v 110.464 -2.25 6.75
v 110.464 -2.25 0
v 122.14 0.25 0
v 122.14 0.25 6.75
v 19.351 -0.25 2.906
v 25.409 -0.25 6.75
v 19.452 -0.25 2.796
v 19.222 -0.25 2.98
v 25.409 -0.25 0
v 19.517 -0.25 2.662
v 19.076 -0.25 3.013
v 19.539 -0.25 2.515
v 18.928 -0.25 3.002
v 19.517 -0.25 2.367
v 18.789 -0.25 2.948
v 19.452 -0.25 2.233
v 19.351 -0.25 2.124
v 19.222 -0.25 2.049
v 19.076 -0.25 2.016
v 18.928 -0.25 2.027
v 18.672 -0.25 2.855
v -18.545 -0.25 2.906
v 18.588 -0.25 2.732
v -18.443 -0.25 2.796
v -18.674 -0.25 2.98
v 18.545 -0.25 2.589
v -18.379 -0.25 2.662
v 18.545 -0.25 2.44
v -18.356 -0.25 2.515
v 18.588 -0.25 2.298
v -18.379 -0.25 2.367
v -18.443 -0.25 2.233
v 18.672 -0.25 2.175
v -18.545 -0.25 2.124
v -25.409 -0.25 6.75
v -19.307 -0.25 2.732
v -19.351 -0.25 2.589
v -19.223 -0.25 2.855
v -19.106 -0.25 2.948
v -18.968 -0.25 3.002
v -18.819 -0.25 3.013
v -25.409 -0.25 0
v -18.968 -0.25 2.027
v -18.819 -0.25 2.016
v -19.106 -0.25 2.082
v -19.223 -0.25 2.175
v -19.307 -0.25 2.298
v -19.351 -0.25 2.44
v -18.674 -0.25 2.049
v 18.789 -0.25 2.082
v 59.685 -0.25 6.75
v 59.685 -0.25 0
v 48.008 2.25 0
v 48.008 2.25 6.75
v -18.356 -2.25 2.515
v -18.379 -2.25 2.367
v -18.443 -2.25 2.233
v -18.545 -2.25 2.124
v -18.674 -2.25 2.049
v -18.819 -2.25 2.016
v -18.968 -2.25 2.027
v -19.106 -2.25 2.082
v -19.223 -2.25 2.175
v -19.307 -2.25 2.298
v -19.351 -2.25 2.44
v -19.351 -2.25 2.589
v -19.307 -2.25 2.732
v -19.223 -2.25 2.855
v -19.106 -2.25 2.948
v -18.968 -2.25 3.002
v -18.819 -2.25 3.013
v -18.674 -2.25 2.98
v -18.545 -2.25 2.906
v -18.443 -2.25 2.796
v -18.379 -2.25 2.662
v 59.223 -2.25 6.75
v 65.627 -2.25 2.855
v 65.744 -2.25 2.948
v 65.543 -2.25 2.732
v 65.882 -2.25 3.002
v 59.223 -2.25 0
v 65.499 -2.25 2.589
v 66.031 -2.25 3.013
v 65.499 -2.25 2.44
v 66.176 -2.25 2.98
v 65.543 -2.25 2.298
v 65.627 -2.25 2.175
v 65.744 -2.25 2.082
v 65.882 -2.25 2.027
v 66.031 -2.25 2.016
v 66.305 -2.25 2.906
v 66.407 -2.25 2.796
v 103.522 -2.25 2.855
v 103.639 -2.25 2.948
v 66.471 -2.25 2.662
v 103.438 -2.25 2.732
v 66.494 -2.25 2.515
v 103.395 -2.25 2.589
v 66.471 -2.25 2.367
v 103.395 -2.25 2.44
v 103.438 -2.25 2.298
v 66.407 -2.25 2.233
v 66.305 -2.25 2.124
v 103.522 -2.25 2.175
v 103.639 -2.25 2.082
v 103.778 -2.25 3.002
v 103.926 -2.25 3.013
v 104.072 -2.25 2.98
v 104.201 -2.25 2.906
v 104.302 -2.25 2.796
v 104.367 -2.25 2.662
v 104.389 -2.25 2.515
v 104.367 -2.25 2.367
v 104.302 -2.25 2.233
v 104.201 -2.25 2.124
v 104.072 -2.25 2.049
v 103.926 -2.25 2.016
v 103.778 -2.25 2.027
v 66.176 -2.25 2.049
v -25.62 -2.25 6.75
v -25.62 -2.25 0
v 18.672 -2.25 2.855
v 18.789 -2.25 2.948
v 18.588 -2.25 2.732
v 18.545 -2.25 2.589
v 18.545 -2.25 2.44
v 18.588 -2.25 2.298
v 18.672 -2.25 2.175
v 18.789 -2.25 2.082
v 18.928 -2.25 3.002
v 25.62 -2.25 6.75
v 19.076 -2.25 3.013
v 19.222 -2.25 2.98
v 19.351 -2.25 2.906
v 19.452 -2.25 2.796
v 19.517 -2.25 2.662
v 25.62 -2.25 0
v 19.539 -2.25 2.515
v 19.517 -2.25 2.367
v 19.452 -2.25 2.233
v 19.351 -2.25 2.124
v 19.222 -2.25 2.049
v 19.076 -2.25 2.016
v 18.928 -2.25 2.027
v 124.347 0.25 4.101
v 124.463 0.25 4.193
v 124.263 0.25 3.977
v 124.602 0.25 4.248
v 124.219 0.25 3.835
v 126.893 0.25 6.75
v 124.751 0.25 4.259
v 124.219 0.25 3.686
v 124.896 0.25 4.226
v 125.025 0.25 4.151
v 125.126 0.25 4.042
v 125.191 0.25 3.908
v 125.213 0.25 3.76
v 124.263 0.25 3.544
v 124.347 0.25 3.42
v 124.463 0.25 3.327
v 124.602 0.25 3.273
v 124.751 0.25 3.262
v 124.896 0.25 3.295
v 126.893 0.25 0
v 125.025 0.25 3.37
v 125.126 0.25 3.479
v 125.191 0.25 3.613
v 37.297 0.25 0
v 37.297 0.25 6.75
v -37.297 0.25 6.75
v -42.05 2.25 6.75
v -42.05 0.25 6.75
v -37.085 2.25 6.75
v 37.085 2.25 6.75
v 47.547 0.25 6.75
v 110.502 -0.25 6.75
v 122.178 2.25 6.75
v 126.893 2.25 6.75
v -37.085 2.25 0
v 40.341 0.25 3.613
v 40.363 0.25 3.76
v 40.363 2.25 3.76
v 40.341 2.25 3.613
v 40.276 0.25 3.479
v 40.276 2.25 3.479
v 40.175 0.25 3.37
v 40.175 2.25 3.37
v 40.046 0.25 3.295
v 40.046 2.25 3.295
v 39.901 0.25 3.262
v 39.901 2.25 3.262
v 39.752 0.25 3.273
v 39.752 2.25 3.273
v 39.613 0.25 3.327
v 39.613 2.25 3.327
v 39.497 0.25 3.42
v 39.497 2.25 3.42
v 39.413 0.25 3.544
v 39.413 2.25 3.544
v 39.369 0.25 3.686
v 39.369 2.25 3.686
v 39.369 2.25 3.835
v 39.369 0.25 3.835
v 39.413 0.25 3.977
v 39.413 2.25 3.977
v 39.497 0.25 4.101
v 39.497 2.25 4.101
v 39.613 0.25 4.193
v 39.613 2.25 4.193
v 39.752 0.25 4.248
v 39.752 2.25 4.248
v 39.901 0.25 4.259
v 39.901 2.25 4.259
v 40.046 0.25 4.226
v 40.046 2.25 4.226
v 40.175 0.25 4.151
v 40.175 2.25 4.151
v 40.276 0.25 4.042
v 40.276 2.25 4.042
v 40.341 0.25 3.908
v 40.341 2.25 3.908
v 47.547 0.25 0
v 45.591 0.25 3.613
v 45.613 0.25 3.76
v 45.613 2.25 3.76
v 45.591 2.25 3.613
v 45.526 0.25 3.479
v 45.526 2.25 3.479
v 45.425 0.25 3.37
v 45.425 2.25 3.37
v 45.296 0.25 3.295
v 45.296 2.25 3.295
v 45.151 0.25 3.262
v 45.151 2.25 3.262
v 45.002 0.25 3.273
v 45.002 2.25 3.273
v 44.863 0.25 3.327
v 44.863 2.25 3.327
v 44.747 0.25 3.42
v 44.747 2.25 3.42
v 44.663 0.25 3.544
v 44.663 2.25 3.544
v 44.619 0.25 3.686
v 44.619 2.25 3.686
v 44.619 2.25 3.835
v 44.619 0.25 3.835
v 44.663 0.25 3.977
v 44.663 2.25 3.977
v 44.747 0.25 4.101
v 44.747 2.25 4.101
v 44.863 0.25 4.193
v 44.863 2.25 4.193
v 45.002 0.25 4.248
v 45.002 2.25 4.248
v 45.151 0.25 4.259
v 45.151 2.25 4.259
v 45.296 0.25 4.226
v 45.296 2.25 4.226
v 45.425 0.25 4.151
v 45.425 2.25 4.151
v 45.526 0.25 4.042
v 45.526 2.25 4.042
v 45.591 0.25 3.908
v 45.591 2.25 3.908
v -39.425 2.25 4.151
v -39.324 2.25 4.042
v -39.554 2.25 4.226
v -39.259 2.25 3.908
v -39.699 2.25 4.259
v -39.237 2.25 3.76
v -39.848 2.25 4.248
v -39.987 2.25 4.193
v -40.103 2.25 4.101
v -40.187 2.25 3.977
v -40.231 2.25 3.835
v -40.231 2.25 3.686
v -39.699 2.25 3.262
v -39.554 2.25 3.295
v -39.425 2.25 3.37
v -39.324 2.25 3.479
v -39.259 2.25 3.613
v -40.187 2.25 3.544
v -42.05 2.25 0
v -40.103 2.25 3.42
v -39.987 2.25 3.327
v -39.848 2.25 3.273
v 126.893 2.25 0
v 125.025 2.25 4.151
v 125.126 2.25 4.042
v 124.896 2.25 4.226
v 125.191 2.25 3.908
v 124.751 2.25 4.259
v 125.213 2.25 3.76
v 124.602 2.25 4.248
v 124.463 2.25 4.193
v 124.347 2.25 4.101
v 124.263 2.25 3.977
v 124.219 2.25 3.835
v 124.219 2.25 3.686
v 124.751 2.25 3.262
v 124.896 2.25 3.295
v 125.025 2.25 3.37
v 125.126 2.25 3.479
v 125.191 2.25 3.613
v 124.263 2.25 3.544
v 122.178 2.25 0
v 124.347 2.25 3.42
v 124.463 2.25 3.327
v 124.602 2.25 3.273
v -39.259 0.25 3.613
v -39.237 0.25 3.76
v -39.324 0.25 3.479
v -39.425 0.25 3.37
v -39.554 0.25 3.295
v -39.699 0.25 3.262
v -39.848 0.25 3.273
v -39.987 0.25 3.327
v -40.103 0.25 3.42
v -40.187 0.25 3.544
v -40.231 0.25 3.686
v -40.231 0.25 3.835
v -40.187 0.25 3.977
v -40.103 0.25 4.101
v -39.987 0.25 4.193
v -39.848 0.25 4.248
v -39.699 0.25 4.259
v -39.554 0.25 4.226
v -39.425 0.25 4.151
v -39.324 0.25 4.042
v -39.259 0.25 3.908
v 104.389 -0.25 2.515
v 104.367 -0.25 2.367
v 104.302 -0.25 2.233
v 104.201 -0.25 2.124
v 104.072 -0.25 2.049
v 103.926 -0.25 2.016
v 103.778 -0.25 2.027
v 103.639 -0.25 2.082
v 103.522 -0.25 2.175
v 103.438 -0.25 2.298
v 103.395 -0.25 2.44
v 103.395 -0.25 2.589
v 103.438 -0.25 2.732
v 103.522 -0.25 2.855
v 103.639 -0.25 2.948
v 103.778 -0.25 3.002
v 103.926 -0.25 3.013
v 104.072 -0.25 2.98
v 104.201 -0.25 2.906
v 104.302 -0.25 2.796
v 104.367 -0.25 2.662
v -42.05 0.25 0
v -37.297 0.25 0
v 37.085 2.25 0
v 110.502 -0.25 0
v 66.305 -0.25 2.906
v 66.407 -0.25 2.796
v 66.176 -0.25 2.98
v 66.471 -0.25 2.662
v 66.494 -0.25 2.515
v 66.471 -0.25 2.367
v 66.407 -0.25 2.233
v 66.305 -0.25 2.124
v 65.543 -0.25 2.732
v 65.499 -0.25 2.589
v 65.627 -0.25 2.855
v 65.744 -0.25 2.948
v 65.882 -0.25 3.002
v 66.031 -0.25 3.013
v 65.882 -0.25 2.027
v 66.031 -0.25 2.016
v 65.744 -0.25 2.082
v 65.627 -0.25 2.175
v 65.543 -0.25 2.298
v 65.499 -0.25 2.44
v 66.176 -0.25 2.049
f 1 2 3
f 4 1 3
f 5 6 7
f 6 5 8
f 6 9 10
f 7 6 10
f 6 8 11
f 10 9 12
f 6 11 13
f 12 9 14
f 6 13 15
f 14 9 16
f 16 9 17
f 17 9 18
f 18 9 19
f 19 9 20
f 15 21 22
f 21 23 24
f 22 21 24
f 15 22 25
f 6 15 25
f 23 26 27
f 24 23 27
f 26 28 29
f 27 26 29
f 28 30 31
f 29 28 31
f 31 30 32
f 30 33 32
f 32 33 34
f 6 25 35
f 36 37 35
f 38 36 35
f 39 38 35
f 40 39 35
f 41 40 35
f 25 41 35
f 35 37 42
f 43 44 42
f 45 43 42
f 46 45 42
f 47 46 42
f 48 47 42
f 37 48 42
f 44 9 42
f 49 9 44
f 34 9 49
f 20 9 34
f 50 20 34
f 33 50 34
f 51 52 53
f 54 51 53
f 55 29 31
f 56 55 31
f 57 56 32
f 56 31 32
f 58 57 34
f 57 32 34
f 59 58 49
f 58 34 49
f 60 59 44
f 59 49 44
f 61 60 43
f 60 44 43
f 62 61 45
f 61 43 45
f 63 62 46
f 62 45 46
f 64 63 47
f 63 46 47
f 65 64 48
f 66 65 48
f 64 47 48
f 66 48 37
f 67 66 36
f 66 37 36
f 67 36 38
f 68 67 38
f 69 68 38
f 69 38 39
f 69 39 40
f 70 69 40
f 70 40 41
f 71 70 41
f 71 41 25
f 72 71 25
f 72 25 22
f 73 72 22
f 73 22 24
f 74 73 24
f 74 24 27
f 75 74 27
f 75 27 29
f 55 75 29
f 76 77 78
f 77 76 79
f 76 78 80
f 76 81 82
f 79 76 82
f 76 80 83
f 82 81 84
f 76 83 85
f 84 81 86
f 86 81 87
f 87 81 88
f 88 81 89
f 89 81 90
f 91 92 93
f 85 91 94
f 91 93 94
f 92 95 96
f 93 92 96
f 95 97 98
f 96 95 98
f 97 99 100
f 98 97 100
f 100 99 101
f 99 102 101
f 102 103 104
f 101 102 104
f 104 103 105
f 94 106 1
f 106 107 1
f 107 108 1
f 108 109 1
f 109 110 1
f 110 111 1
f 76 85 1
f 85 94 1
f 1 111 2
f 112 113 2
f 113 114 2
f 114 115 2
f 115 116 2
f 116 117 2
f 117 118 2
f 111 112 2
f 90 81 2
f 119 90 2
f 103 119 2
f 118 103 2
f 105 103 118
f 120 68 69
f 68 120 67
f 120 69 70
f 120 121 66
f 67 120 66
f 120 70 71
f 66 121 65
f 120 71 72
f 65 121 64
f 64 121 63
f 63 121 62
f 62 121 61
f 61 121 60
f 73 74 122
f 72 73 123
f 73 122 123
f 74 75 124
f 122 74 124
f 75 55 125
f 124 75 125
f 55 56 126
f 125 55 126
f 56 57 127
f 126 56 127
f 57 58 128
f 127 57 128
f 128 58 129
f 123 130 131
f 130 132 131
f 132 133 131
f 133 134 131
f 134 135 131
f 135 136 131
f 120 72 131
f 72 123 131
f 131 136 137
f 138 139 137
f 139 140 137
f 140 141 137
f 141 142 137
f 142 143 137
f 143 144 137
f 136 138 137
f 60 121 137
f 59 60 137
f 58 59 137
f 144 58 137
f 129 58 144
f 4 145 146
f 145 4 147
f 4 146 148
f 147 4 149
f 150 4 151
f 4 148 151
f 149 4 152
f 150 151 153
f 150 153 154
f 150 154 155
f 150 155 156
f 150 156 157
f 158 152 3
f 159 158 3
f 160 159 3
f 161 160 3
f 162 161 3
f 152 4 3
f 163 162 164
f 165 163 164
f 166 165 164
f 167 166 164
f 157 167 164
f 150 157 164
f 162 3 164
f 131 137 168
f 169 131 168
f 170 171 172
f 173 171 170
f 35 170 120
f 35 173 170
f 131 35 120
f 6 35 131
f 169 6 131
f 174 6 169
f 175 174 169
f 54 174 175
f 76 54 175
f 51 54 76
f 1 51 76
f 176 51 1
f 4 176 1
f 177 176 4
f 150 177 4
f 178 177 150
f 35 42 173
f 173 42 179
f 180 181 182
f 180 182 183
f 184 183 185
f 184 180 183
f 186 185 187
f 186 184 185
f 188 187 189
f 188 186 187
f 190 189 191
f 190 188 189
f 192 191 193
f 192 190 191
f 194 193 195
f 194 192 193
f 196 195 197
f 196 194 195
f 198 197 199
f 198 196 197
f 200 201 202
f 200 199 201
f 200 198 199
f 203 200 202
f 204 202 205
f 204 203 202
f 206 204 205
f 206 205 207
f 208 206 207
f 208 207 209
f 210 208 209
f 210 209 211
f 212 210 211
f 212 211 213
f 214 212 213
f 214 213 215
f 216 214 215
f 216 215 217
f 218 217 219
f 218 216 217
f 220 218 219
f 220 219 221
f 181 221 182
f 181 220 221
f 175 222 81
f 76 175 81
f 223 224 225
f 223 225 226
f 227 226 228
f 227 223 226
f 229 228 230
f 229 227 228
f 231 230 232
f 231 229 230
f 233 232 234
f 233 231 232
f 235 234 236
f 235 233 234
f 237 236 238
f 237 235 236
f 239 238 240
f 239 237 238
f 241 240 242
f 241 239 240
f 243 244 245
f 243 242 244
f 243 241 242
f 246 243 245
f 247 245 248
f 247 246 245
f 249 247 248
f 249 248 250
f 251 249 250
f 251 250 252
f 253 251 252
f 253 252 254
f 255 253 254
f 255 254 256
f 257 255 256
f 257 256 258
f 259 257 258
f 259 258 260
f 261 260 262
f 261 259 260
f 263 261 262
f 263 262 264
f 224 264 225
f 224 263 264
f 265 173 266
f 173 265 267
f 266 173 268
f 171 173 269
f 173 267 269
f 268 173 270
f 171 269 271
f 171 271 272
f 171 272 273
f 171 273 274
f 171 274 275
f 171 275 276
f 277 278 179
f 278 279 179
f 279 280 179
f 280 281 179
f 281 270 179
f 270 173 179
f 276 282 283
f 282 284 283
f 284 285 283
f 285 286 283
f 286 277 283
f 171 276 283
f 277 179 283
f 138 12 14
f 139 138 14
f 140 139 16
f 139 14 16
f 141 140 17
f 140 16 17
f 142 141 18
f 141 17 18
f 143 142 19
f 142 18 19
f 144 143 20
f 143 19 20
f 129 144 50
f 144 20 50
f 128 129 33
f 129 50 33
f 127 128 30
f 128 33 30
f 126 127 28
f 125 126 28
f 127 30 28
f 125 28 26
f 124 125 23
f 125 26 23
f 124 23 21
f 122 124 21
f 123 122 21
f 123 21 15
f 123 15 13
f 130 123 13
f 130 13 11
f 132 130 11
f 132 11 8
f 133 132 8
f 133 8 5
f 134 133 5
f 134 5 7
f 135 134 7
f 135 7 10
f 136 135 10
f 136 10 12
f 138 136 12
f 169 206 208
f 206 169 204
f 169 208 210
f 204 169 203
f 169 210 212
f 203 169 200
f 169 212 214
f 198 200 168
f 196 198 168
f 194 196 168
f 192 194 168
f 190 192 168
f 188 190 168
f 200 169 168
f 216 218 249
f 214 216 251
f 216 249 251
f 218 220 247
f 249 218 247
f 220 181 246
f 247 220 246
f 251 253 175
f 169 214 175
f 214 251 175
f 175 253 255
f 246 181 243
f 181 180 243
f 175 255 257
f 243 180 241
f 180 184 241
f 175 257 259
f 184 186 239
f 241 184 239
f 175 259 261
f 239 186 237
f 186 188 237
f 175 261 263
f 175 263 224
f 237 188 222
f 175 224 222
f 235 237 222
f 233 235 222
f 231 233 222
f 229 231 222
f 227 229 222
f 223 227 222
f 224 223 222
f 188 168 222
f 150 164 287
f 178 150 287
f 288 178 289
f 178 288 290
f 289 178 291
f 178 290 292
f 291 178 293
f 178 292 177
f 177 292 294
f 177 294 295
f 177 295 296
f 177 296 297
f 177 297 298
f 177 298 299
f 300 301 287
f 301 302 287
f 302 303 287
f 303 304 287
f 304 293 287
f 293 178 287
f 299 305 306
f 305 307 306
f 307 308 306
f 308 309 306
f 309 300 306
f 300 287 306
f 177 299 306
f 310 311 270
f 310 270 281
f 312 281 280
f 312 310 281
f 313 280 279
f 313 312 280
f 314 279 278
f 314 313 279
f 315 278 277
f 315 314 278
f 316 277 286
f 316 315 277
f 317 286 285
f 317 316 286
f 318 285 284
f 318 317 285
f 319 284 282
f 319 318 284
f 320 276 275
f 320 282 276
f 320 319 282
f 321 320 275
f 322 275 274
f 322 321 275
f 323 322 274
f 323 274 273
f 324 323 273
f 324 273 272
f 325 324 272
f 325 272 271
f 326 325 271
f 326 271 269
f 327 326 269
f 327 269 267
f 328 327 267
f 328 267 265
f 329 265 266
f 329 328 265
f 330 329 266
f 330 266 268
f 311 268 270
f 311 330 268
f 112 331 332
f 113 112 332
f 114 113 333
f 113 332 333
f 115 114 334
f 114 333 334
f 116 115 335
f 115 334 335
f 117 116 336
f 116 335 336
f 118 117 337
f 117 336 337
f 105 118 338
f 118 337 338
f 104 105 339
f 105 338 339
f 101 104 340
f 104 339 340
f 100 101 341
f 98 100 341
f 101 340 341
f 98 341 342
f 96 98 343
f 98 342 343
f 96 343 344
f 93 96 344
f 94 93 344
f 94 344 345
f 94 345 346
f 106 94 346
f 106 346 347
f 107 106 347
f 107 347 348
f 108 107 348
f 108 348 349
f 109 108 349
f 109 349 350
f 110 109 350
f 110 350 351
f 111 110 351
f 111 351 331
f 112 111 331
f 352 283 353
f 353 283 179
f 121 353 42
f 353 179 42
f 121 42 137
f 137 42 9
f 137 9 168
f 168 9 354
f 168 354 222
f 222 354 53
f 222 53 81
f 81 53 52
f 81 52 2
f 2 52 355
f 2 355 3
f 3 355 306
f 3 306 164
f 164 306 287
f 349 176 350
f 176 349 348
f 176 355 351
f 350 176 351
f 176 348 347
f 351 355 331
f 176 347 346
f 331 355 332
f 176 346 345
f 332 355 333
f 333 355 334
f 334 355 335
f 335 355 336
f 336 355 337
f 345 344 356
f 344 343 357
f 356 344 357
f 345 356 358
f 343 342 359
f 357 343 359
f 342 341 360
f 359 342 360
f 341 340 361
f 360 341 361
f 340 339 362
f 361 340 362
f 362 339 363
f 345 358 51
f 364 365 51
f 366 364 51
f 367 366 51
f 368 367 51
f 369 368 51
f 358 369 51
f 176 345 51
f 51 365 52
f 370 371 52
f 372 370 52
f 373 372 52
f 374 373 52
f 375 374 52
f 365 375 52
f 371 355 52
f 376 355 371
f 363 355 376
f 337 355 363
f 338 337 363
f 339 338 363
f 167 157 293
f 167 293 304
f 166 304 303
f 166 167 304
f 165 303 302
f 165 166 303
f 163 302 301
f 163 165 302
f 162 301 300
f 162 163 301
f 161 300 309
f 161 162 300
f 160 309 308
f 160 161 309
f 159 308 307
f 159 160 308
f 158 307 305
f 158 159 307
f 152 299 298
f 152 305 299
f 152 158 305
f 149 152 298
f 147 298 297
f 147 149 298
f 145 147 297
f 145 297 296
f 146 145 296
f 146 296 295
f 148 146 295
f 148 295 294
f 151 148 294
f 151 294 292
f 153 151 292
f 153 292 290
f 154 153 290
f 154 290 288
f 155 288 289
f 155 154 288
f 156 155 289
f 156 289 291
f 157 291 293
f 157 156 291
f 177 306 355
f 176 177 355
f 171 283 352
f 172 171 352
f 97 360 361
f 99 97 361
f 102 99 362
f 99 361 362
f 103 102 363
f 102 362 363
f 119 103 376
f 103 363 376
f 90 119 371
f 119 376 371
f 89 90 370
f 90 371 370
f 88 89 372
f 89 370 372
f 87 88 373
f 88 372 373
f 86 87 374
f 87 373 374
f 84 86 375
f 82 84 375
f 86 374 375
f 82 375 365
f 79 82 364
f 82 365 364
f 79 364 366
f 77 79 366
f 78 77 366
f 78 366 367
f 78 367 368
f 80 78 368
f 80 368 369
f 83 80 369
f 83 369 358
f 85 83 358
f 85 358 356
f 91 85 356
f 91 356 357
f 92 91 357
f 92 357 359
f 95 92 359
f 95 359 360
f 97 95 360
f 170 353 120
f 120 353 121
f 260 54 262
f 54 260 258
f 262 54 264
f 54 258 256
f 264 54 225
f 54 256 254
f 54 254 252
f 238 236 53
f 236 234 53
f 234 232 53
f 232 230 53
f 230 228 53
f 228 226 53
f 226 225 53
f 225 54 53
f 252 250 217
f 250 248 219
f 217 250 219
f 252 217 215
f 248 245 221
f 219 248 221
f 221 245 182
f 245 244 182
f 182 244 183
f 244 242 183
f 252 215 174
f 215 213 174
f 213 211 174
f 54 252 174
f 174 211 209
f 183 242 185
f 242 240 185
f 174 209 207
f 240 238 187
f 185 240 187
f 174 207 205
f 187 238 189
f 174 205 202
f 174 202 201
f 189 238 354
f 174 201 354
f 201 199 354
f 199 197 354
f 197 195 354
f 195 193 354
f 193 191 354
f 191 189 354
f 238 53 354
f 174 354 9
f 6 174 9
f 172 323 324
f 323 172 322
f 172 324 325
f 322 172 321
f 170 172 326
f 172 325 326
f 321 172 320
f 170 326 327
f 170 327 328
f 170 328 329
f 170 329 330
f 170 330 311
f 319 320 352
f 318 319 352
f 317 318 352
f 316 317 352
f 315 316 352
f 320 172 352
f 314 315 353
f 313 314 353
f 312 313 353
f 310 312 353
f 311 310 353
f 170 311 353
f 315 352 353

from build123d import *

# Parameters (mm, degrees)
BOSS_EXTRUDE1_DEPTH     = 6.75
SKETCH2_R               = 0.5
CUT_EXTRUDE1_DEPTH      = 3.5
CUT_EXTRUDE1_DEPTH_BACK = 3


with BuildPart() as part:
    # Sketch1 → Boss-Extrude1 (new body)
    with BuildSketch(Plane.XY):
        Polygon((37.296734757, 0.25), (47.546734757, 0.25), (59.223236254, -2.25), (110.463879182, -2.25), (122.14020427, 0.25), (126.893469513, 0.25), (126.893469513, 2.25), (122.178494939, 2.25), (110.502169851, -0.25), (59.684942458, -0.25), (48.00844096, 2.25), (37.085028553, 2.25), (25.408527056, -0.25), (-25.408700338, -0.25), (-37.085025426, 2.25), (-42.05, 2.25), (-42.05, 0.25), (-37.296734757, 0.25), (-25.620409669, -2.25), (25.620233259, -2.25), align=None)
    extrude(amount=BOSS_EXTRUDE1_DEPTH)

    # Sketch2 → Cut-Extrude1 (cut, two sides)
    with BuildSketch(Plane(origin=(0, -0.25, 0), x_dir=(1, 0, 0), z_dir=(0, 1, 0))) as cut_extrude1_sk:
        with Locations((45.113142199, -3.760486085)):
            Circle(SKETCH2_R)
        with Locations((65.993568392, -2.514696302)):
            Circle(SKETCH2_R)
        with Locations((103.888971043, -2.514696302)):
            Circle(SKETCH2_R)
        with Locations((124.713142199, -3.760486085)):
            Circle(SKETCH2_R)
        with Locations((39.863142199, -3.760486085)):
            Circle(SKETCH2_R)
        with Locations((-39.736857801, -3.760486085)):
            Circle(SKETCH2_R)
        with Locations((19.038971043, -2.514696302)):
            Circle(SKETCH2_R)
        with Locations((-18.856431608, -2.514696302)):
            Circle(SKETCH2_R)
    extrude(amount=CUT_EXTRUDE1_DEPTH, mode=Mode.SUBTRACT)
    extrude(cut_extrude1_sk.sketch, amount=-CUT_EXTRUDE1_DEPTH_BACK, mode=Mode.SUBTRACT)


solid = part.part
